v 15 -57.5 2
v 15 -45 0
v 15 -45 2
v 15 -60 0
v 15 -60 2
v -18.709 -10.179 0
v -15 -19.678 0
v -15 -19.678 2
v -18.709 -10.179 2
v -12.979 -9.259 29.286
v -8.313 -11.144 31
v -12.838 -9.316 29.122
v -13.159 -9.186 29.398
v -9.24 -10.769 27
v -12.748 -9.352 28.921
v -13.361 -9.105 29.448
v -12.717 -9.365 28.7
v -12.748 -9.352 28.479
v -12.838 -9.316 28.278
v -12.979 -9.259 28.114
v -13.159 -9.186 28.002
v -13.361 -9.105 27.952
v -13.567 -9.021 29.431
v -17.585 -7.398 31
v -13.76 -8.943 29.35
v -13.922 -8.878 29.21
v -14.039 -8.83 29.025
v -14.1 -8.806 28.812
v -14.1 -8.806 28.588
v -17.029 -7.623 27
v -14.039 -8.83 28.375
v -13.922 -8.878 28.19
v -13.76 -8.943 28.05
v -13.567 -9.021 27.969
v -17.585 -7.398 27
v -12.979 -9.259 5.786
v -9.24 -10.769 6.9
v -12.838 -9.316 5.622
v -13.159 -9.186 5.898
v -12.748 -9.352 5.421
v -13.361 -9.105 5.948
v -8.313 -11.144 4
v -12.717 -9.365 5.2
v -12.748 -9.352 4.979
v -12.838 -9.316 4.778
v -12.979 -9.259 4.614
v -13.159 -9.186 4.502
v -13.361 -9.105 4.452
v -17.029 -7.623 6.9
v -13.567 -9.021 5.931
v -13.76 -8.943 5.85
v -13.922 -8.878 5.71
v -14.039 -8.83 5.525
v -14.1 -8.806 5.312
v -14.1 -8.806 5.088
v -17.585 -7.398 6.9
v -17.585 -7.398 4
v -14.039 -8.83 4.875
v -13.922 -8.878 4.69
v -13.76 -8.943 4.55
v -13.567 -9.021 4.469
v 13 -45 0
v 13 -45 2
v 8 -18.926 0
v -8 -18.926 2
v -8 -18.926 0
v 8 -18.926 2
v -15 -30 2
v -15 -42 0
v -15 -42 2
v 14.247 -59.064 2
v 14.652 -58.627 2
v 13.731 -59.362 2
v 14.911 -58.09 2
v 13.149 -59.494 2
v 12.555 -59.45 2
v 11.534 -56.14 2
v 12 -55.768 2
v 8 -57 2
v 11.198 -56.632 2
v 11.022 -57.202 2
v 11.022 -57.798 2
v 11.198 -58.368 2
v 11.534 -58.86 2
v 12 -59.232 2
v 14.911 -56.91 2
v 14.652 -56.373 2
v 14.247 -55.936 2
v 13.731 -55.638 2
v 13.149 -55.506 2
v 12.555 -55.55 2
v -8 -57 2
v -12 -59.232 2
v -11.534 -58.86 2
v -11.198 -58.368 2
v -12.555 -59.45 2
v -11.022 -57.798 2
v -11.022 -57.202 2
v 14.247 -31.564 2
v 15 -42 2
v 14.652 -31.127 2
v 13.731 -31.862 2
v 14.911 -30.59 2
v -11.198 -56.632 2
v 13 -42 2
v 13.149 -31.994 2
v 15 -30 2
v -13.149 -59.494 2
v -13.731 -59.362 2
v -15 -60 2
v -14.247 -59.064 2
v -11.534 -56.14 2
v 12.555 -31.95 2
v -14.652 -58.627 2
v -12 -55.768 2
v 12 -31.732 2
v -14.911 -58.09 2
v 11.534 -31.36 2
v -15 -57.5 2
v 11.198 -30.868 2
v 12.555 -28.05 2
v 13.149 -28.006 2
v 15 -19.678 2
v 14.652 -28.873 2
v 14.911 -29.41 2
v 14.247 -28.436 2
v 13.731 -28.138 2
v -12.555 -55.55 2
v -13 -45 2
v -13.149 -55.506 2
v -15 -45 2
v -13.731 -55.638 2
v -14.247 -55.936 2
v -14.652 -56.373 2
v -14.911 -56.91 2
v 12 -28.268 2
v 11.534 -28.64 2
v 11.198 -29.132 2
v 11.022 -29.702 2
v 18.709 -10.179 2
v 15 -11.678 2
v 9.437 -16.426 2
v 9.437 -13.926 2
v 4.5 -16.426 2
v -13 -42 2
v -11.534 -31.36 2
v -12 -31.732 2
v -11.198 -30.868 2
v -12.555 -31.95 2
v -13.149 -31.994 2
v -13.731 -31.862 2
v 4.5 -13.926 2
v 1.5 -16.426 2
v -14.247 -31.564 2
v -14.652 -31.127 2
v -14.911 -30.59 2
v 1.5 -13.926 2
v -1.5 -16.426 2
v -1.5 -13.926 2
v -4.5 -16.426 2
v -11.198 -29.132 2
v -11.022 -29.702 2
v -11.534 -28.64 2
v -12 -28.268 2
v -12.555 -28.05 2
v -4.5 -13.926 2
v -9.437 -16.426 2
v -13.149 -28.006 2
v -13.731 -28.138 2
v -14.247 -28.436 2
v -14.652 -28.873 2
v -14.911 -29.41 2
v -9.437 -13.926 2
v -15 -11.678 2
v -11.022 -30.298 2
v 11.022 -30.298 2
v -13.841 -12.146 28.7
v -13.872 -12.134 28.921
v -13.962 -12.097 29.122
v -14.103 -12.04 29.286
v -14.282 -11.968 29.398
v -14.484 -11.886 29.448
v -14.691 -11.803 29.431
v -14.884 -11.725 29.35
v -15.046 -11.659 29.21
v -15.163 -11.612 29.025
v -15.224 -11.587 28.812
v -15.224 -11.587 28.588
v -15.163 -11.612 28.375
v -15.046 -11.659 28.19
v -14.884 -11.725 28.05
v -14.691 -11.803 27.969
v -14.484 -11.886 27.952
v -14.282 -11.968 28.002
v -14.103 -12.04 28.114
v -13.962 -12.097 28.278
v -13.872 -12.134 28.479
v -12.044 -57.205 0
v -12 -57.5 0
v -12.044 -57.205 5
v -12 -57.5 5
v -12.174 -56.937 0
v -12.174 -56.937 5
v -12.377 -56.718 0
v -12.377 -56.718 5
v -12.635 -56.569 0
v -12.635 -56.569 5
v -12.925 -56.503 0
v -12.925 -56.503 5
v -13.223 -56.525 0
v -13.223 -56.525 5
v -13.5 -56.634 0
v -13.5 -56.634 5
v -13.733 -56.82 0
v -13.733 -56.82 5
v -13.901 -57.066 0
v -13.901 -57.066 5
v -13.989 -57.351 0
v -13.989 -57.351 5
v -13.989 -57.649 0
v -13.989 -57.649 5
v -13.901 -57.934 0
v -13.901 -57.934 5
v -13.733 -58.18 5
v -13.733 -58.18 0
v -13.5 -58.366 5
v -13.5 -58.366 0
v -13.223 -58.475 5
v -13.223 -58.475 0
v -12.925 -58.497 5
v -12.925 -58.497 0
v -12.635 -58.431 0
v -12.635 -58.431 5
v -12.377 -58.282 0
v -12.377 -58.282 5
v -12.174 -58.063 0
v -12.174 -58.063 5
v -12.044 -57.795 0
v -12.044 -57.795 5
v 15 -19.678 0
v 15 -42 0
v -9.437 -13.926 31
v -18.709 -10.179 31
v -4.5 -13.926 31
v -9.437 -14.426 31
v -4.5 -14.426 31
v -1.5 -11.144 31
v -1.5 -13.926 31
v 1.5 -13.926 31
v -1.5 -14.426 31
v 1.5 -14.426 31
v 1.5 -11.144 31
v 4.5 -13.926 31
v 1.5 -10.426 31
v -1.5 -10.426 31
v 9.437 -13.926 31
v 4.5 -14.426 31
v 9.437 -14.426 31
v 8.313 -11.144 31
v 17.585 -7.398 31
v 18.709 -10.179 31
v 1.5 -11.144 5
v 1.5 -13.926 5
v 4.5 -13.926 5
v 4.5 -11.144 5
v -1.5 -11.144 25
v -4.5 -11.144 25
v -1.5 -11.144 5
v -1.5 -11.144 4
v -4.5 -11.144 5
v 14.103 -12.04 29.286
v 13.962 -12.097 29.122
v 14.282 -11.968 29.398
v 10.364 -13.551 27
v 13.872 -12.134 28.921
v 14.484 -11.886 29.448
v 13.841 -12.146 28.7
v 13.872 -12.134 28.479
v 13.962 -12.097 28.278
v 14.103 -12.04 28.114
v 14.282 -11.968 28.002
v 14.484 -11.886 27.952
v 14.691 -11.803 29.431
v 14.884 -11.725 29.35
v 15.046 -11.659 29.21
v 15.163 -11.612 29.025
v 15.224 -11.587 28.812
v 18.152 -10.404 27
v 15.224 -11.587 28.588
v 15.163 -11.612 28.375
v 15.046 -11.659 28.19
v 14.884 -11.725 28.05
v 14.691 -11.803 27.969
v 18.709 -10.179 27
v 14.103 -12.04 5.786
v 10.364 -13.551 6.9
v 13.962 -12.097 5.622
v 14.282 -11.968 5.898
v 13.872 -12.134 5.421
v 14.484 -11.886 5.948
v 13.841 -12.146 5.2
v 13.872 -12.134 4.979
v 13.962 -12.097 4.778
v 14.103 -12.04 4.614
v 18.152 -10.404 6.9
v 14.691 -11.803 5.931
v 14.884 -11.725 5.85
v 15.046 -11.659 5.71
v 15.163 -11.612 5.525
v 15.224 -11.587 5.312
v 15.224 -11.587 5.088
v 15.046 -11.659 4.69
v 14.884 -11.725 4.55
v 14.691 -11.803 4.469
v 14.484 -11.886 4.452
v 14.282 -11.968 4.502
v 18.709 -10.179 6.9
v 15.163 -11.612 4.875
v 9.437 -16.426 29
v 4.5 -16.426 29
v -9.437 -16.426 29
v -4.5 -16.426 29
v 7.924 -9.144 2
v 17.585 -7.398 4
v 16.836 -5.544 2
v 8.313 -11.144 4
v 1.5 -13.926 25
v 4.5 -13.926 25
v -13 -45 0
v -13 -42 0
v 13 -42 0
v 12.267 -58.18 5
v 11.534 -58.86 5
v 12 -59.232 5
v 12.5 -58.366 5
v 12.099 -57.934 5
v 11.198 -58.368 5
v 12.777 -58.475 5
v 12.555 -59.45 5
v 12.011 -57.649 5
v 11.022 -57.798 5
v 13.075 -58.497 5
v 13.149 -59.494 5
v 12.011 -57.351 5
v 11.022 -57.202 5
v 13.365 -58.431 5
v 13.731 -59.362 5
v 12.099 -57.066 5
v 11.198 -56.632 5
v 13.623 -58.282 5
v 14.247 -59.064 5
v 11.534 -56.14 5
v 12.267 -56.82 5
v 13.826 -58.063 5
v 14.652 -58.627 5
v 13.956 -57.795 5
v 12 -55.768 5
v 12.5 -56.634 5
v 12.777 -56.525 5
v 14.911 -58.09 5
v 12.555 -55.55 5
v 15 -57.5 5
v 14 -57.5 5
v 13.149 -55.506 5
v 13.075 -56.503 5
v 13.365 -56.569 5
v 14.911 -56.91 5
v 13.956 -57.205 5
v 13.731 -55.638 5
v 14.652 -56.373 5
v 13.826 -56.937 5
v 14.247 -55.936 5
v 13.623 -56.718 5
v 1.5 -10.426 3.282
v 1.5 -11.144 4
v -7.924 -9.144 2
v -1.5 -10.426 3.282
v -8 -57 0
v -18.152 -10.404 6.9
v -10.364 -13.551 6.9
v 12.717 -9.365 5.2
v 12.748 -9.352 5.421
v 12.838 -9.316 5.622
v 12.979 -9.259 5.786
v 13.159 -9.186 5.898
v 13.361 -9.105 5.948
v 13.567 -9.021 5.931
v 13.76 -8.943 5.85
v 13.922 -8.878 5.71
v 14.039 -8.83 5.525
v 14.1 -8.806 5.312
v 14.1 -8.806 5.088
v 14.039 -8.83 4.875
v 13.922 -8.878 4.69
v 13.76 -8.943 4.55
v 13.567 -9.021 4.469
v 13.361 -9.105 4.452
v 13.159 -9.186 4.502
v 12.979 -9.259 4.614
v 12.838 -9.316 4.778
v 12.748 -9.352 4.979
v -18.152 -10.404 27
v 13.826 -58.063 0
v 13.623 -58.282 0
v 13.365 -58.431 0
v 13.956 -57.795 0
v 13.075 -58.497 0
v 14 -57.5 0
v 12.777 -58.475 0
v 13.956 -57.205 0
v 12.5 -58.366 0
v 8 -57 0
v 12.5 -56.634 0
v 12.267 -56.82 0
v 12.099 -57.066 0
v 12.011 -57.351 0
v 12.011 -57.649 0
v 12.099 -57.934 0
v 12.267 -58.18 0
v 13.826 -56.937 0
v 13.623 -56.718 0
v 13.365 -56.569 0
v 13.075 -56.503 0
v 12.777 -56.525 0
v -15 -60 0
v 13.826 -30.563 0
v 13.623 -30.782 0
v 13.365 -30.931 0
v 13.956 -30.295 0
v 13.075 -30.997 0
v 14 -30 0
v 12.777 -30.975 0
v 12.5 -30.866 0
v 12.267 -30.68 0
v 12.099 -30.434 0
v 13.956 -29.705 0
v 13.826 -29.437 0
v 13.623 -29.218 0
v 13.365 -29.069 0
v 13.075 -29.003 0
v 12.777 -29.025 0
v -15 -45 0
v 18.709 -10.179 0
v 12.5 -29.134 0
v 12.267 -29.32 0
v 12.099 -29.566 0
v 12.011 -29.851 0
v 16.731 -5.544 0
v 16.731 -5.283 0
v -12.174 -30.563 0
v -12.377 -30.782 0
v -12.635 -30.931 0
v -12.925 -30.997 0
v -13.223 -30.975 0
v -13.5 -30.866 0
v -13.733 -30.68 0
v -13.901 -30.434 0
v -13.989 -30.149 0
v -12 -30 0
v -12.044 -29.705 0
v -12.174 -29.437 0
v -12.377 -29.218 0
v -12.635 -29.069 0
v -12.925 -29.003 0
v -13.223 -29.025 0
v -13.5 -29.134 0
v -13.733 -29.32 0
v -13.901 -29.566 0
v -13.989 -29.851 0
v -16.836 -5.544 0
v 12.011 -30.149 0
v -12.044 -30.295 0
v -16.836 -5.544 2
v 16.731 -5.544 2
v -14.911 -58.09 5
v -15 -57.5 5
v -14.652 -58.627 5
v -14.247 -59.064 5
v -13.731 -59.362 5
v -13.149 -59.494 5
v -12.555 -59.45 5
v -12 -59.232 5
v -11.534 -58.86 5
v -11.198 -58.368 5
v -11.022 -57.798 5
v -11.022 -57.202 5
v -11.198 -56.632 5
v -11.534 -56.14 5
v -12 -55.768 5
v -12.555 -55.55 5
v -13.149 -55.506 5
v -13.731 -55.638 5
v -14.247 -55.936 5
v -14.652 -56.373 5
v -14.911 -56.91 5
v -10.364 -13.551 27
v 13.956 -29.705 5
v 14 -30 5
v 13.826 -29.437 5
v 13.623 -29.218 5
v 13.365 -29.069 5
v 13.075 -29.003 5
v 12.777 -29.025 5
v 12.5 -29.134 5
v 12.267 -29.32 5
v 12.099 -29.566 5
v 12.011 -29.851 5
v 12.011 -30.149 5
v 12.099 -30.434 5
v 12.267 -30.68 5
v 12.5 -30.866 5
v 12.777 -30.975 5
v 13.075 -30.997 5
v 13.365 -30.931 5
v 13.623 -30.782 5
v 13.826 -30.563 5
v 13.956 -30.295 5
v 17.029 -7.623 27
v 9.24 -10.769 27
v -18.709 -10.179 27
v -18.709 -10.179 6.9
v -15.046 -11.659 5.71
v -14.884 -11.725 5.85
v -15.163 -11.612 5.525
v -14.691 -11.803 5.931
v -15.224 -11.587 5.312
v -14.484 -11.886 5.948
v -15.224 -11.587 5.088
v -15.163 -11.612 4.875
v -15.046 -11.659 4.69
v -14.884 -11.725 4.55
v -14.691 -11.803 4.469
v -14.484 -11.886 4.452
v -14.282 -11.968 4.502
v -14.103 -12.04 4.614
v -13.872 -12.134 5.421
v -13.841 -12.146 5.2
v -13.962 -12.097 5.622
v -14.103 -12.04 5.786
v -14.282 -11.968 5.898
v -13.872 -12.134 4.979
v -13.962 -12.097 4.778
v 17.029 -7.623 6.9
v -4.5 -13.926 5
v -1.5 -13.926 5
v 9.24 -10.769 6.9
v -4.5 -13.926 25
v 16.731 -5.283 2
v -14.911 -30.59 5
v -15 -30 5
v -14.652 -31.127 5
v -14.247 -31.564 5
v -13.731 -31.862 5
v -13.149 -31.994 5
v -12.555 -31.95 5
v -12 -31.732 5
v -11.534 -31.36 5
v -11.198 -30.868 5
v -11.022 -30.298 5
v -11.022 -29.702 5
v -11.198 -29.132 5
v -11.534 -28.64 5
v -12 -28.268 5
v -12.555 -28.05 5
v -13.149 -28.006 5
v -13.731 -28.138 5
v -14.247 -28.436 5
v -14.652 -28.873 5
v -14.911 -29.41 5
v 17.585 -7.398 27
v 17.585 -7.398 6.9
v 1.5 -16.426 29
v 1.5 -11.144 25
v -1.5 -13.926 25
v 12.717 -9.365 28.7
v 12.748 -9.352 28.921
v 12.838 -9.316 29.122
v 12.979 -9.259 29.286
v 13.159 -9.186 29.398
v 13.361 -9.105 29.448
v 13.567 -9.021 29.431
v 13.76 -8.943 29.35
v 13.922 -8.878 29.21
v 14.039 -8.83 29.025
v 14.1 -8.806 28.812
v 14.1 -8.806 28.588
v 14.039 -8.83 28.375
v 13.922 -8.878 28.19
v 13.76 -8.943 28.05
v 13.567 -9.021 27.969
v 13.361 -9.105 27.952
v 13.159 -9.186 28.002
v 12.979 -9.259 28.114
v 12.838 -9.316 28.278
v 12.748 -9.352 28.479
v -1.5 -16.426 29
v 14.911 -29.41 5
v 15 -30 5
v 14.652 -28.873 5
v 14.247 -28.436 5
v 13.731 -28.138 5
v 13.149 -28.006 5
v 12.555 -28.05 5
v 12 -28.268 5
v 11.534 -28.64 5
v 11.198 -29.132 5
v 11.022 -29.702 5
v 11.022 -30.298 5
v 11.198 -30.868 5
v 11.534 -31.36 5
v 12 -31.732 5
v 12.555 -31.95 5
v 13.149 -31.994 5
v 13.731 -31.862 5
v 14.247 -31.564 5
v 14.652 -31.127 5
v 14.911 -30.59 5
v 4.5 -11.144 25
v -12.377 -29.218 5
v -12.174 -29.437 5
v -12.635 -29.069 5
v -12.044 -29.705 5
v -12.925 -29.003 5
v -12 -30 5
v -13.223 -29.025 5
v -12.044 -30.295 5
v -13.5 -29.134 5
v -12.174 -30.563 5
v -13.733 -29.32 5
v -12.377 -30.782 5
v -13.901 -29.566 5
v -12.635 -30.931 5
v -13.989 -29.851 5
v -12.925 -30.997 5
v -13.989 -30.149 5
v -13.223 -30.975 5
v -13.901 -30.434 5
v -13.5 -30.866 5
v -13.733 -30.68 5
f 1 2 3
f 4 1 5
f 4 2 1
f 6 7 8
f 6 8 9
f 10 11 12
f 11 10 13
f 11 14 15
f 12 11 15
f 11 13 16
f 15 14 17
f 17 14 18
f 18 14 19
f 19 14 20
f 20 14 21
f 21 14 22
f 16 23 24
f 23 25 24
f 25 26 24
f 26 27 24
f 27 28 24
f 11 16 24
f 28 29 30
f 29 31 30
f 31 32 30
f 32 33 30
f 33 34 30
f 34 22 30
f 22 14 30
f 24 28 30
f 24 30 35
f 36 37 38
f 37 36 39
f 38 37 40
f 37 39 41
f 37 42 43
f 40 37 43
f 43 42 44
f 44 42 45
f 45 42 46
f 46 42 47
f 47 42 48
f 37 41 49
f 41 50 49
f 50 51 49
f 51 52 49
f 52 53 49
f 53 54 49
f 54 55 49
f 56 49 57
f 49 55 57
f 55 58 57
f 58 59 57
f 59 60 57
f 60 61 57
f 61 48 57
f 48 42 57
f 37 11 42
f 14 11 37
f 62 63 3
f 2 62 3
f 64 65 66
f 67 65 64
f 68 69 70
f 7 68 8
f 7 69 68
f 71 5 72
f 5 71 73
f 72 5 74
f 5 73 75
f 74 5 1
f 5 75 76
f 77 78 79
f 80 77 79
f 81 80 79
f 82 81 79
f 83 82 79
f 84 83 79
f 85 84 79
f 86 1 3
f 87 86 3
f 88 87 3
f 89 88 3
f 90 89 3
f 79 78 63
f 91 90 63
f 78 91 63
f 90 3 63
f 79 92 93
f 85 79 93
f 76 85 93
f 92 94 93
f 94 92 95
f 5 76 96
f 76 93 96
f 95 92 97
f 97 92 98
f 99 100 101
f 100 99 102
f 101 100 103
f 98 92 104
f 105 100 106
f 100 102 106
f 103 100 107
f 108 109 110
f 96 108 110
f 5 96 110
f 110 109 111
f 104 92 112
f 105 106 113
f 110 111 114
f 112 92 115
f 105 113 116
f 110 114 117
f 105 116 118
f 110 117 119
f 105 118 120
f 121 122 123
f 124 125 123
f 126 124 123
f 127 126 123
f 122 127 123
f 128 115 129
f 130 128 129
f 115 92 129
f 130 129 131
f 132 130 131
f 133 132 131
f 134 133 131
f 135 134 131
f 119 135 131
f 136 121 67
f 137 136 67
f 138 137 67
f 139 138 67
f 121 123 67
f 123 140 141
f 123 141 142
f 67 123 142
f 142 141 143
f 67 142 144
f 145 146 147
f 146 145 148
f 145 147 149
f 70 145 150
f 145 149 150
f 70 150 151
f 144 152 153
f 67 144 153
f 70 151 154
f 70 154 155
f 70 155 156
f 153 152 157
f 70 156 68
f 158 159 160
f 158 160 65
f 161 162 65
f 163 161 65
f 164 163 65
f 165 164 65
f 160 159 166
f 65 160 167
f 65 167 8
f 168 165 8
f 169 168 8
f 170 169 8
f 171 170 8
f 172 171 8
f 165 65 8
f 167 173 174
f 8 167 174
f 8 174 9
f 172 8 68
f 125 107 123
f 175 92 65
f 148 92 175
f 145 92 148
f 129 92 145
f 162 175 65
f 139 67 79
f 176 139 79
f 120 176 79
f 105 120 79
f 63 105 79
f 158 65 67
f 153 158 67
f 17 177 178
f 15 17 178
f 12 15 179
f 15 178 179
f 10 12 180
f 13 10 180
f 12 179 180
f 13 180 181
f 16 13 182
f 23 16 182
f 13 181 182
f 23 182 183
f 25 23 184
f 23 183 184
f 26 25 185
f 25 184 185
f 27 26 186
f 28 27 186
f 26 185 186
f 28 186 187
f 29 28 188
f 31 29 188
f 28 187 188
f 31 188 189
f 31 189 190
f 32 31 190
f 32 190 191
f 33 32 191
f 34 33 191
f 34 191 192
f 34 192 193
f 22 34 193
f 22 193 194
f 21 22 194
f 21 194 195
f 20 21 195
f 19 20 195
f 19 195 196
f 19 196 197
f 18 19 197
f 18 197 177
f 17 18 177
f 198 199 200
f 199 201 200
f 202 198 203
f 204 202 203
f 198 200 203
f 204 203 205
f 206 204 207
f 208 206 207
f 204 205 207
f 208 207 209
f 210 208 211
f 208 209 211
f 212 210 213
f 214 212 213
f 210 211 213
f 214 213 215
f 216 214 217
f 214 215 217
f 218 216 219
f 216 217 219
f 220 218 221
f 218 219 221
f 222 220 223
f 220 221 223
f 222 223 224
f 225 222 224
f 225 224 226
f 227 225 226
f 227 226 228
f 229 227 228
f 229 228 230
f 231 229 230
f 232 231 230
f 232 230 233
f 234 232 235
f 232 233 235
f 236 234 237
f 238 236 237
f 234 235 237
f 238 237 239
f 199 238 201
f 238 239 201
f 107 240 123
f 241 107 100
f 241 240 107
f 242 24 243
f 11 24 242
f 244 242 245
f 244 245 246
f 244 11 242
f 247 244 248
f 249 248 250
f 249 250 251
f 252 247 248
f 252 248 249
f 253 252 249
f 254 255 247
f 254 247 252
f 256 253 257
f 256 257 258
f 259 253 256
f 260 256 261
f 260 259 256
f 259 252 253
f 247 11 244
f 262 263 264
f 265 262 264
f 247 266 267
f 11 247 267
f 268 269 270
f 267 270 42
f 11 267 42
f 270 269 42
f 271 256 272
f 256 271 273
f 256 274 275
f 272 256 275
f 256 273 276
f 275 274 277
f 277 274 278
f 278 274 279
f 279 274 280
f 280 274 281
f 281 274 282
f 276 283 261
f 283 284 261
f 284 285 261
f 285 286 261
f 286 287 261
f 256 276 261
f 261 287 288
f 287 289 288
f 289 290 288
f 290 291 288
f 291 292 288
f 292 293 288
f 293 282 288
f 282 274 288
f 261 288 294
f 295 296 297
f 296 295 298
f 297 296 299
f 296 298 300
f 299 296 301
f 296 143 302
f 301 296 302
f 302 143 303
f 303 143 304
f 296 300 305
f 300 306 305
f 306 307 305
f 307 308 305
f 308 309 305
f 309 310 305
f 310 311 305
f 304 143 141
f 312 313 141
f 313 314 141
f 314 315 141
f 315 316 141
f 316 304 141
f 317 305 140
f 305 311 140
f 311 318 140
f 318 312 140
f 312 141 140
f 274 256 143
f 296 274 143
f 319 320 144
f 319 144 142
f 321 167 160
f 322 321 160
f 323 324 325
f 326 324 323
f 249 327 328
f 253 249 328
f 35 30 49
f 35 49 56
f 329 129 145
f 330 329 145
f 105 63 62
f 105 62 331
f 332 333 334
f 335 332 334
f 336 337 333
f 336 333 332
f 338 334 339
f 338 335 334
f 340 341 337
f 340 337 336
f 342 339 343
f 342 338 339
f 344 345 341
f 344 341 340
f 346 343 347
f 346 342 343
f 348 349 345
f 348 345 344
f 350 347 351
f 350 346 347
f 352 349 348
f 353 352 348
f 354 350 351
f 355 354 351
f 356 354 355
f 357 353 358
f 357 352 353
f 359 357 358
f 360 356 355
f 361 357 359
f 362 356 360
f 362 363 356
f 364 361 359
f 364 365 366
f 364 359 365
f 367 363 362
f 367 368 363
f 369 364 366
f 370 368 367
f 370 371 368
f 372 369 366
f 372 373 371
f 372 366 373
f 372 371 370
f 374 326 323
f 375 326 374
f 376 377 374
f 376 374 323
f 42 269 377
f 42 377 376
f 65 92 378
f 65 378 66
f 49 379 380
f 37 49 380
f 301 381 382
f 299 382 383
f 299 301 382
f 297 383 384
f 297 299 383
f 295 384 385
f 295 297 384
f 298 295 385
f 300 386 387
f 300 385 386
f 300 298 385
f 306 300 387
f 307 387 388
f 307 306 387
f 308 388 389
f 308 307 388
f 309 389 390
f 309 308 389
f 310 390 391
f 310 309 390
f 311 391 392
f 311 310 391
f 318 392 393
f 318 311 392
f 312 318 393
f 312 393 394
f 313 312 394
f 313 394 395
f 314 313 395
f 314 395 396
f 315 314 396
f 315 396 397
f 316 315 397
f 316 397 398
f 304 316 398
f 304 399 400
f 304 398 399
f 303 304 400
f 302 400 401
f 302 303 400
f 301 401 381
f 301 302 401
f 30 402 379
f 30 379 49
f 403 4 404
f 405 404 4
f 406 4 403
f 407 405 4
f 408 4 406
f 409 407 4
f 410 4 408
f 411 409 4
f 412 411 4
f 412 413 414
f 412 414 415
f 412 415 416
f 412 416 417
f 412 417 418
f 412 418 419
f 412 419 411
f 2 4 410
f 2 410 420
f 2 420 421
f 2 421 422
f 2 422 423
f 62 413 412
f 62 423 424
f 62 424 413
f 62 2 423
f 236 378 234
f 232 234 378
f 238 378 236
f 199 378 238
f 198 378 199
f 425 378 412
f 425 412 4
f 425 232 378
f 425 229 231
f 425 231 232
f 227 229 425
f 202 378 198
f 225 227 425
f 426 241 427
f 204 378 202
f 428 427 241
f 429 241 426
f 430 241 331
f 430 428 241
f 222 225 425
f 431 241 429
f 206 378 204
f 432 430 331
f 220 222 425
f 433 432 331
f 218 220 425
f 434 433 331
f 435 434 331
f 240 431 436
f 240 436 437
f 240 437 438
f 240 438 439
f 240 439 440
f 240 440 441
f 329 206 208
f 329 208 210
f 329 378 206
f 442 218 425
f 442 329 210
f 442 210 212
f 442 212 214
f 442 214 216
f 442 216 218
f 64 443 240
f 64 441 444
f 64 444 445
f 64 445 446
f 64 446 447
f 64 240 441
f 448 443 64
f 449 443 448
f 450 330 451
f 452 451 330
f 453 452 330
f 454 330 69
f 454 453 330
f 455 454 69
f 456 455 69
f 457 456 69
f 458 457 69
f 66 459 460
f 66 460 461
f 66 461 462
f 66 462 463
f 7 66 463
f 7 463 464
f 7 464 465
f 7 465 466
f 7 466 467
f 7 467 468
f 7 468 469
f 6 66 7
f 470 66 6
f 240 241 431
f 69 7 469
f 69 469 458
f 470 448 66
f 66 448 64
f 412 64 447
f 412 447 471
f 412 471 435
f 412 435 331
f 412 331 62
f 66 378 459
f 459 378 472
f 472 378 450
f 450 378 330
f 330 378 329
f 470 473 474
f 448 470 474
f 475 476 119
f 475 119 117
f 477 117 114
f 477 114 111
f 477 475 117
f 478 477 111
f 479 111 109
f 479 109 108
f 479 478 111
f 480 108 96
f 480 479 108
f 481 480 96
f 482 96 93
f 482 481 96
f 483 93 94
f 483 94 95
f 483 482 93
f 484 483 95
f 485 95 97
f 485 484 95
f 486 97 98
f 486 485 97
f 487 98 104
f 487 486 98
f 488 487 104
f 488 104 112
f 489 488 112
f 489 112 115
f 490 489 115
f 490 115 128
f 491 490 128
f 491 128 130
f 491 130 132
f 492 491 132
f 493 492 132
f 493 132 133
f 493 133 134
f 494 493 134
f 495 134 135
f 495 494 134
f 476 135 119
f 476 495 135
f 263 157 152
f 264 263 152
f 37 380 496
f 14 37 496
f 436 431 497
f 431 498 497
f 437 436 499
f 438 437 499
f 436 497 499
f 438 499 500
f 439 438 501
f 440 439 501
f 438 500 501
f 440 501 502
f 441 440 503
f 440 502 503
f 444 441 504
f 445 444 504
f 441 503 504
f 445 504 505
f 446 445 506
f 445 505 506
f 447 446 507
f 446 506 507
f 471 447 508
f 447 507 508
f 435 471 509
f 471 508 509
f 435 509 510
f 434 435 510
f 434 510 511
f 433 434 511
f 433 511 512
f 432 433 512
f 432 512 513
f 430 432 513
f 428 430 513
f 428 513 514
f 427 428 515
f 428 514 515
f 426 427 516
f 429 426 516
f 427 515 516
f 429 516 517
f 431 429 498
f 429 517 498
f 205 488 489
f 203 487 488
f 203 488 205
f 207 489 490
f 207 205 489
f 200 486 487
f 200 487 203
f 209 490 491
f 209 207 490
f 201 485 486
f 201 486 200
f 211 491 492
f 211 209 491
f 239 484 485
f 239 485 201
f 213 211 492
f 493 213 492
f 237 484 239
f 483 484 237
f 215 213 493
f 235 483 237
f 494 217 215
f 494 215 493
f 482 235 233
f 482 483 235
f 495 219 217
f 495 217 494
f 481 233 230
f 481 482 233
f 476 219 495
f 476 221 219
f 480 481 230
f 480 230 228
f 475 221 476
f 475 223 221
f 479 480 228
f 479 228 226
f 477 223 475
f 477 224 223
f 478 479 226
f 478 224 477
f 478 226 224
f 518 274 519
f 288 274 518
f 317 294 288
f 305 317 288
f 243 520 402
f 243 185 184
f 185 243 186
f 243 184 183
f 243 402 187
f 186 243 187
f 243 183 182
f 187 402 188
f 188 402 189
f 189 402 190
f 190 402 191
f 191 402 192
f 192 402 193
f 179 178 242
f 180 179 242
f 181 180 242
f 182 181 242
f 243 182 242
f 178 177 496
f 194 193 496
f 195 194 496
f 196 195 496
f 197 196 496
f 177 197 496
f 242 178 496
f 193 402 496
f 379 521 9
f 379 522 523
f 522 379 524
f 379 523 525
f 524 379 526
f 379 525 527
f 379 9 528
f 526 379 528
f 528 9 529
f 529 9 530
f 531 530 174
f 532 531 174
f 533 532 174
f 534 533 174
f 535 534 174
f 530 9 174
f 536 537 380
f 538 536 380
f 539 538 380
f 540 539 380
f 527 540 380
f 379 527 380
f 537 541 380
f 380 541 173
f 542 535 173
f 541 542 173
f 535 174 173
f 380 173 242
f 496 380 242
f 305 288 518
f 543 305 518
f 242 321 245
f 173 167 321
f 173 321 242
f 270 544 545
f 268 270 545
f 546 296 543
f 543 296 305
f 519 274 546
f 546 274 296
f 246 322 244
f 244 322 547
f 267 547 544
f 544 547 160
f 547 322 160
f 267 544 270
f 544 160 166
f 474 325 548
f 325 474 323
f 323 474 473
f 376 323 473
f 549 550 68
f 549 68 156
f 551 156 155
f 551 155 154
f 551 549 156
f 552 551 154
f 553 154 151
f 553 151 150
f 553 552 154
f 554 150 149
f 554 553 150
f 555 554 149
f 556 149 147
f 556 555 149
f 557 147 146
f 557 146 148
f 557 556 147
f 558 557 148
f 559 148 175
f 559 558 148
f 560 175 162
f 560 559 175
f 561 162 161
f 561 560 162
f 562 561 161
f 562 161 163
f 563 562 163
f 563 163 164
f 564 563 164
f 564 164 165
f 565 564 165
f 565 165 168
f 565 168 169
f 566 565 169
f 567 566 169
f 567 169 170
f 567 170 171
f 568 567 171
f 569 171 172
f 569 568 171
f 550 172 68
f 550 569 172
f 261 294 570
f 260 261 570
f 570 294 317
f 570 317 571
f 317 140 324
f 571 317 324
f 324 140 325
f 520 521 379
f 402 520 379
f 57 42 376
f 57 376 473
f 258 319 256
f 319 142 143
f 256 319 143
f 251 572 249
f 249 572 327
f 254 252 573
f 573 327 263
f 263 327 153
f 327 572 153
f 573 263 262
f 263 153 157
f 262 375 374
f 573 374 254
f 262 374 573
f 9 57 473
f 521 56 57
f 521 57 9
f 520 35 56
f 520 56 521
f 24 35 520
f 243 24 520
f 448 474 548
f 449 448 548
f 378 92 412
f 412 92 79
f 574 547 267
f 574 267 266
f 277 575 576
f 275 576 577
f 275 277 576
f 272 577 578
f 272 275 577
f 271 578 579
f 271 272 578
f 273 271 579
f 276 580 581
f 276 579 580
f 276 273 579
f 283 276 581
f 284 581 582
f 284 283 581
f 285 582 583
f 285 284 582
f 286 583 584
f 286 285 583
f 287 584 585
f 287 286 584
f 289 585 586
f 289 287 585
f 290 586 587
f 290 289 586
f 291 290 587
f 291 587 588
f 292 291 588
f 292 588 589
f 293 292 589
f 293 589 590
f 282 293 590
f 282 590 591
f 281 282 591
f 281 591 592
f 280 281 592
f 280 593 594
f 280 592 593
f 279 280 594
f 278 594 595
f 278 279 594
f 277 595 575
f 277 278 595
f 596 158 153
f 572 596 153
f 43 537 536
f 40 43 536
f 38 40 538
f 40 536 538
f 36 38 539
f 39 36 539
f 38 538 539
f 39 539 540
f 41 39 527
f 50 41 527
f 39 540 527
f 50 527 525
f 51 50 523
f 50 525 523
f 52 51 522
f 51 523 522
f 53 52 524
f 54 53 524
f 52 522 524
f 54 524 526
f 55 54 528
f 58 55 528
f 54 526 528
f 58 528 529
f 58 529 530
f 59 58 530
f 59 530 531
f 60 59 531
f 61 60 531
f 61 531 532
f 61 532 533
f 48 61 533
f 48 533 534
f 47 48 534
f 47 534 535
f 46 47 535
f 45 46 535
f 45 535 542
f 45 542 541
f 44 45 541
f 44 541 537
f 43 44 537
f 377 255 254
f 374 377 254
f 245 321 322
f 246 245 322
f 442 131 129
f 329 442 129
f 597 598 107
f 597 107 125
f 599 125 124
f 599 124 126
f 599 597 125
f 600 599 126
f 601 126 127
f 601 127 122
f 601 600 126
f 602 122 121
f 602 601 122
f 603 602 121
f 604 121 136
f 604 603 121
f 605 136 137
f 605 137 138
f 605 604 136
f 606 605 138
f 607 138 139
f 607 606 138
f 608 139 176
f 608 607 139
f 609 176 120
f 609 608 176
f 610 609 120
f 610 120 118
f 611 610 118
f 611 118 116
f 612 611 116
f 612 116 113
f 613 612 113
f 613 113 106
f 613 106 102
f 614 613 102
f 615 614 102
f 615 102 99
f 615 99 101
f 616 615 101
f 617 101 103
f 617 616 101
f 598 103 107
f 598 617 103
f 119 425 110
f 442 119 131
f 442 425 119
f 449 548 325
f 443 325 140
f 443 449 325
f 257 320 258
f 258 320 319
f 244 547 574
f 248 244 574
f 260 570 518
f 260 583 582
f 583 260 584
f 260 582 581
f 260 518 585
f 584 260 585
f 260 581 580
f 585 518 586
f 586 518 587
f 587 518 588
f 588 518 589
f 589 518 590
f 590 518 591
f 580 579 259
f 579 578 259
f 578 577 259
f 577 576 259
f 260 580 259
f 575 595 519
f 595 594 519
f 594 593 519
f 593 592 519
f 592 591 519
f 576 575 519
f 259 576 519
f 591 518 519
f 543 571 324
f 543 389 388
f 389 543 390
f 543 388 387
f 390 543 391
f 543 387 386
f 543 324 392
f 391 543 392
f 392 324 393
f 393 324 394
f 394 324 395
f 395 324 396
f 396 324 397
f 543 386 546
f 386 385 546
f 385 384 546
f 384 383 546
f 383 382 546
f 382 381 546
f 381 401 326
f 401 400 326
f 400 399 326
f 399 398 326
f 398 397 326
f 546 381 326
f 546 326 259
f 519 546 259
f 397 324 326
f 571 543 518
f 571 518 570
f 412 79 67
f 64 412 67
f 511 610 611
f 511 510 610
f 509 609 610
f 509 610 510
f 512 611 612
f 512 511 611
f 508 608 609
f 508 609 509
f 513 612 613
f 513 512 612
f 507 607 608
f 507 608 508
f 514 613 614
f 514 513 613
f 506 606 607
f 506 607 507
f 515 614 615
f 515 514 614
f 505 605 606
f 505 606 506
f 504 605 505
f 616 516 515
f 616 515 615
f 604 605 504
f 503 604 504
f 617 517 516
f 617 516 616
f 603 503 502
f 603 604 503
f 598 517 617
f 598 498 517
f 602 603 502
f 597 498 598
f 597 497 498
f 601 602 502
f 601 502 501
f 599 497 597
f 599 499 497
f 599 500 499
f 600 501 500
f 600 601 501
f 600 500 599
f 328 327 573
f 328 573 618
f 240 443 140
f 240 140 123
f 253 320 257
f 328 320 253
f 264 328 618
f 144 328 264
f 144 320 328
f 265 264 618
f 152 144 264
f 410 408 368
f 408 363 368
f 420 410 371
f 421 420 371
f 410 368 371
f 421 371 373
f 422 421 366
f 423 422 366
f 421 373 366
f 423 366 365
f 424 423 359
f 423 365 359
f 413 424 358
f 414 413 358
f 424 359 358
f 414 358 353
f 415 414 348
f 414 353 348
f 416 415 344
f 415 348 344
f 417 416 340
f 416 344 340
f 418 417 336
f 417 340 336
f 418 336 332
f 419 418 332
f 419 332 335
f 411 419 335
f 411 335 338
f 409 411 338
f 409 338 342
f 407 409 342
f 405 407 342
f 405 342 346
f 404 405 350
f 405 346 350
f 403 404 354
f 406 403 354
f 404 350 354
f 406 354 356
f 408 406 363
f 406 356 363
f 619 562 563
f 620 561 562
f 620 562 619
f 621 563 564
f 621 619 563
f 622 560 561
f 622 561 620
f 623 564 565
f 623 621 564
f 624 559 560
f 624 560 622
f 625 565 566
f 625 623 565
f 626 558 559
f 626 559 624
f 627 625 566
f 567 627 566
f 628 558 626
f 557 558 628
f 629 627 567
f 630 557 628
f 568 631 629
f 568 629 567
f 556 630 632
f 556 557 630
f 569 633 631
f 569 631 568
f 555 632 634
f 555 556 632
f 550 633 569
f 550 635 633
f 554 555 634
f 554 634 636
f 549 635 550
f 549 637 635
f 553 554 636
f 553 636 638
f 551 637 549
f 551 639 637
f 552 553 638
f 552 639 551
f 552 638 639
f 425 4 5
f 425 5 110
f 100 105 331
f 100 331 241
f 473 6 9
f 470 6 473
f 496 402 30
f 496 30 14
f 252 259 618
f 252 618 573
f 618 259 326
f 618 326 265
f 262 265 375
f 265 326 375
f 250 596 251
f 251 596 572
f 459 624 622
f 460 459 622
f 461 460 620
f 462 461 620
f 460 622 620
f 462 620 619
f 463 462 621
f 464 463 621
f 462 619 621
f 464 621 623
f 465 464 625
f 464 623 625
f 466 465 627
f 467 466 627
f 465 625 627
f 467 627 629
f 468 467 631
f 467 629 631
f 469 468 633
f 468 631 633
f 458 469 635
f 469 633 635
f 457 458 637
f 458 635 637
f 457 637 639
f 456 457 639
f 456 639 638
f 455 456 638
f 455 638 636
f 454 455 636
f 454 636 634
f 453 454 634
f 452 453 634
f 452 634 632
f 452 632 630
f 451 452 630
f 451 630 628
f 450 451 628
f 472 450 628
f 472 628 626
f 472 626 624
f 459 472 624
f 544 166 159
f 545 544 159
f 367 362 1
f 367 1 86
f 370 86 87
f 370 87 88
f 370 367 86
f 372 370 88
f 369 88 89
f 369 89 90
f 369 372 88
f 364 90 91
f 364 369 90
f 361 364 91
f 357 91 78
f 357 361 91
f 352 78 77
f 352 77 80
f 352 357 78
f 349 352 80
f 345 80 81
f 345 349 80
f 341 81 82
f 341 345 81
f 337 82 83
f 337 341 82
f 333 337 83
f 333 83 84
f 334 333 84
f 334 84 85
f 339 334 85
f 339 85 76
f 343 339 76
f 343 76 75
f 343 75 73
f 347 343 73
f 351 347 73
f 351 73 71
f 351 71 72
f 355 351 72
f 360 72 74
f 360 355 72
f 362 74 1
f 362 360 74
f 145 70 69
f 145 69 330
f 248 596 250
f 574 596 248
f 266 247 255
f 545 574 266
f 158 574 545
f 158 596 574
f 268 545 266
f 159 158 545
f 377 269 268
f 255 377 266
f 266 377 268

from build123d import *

# Parameters (mm, degrees)
EXTRUDE_1_DEPTH      = 2
EXTRUDE_2_DEPTH      = 29
EXTRUDE_2_DEPTH_BACK = 2
CUT_EXTRUDE_5_REACH  = 60.965
SKETCH_3_R           = 0.75
SKETCH_3_W           = 9
SKETCH_3_H           = 20.1
CUT_EXTRUDE_7_REACH  = 61.851
SKETCH_12_R          = 0.75
SKETCH_12_W          = 9
SKETCH_12_H          = 20.1
CUT_EXTRUDE_8_REACH  = 71.217
SKETCH_13_R          = 1
SKETCH_13_W          = 16
SKETCH_13_H          = 38.074491789
SKETCH_13_W_2        = 2
SKETCH_13_H_2        = 3
CHAMFER_4_SIZE       = 1
CHAMFER_5_SIZE       = 2
EXTRUDE_START        = -29
SKETCH_14_W          = 3
SKETCH_14_H          = 6
SKETCH_14_W_2        = 4.936896873
SKETCH_14_H_2        = 2.5
EXTRUDE_8_DEPTH      = 29
CHAMFER_6_SIZE       = 2
EXTRUDE_START_2      = 3
SKETCH_15_R          = 2
SKETCH_15_R_2        = 1
EXTRUDE_9_DEPTH      = 3
CUT_EXTRUDE_9_REACH  = 60.599
SKETCH_16_W          = 3
SKETCH_16_H          = 20
EXTRUDE_10_DEPTH     = 2
EXTRUDE_11_DEPTH     = 24.1
CUT_EXTRUDE_11_REACH = 71.217
SKETCH_20_W          = 33.566306147
SKETCH_20_H          = 6.687524296


with BuildPart() as part:
    # 草圖1 → 填料-伸長1 (new body)
    with BuildSketch(Plane.XY):
        Polygon((-15, 0), (15, 0), (15, -1), (18.708735418, -10.179442277), (15, -11.67786865), (15, -60), (-15, -60), (-15, -11.67786865), (-18.708735418, -10.179442277), (-15, -1), align=None)
    extrude(amount=EXTRUDE_1_DEPTH)

    # 草圖2 → 填料-伸長2 (add, two sides: drawn at the far end of the back side and taken through both)
    with BuildSketch(Plane.XY.offset(2).offset(-EXTRUDE_2_DEPTH_BACK)):
        Polygon((-18.708735418, -10.179442277), (-9.436896873, -13.925508211), (9.436896873, -13.925508211), (18.708735418, -10.179442277), (17.584915638, -7.397890713), (8.313077092, -11.143956647), (-8.313077092, -11.143956647), (-17.584915638, -7.397890713), align=None)
    extrude(amount=EXTRUDE_2_DEPTH + EXTRUDE_2_DEPTH_BACK)

    # 草圖3 → 除料-伸長5 (cut, up to next)
    with BuildSketch(Plane(origin=(4.914686172, -15.752599933, 0), x_dir=(0.9271838545667884, 0.37460659341590963, 0), z_dir=(-0.37460659341590963, 0.9271838545667884, 0)), mode=Mode.PRIVATE) as cut_extrude_5_sk1:
        with Locations(Location((10.377361354, -5.2, 0), (0, 0, 180))):
            Circle(SKETCH_3_R)
    cut_extrude_5_tool1 = extrude(cut_extrude_5_sk1.sketch, amount=CUT_EXTRUDE_5_REACH, mode=Mode.PRIVATE) & part.part
    # 草圖3 → 除料-伸長5 (cut, up to next)
    with BuildSketch(Plane(origin=(4.914686172, -15.752599933, 0), x_dir=(0.9271838545667884, 0.37460659341590963, 0), z_dir=(-0.37460659341590963, 0.9271838545667884, 0)), mode=Mode.PRIVATE) as cut_extrude_5_sk2:
        with Locations(Location((10.377361354, -28.7, 0), (0, 0, 180))):
            Circle(SKETCH_3_R)
    cut_extrude_5_tool2 = extrude(cut_extrude_5_sk2.sketch, amount=CUT_EXTRUDE_5_REACH, mode=Mode.PRIVATE) & part.part
    # 草圖3 → 除料-伸長5 (cut, up to next)
    with BuildSketch(Plane(origin=(4.914686172, -15.752599933, 0), x_dir=(0.9271838545667884, 0.37460659341590963, 0), z_dir=(-0.37460659341590963, 0.9271838545667884, 0)), mode=Mode.PRIVATE) as cut_extrude_5_sk3:
        with Locations((10.377361354, -16.95)):
            Rectangle(SKETCH_3_W, SKETCH_3_H)
    cut_extrude_5_tool3 = extrude(cut_extrude_5_sk3.sketch, amount=CUT_EXTRUDE_5_REACH, mode=Mode.PRIVATE) & part.part
    add(cut_extrude_5_tool1.solids().sort_by_distance((14.536408, -11.865172, 5.2))[0], mode=Mode.SUBTRACT)
    add(cut_extrude_5_tool2.solids().sort_by_distance((14.536408, -11.865172, 28.7))[0], mode=Mode.SUBTRACT)
    add(cut_extrude_5_tool3.solids().sort_by_distance((14.536408, -11.865172, 16.95))[0], mode=Mode.SUBTRACT)

    # 草圖12 → 除料-伸長7 (cut, up to next)
    with BuildSketch(Plane(origin=(-6.161016101, -15.249049955, 0), x_dir=(0.9271838545667846, -0.3746065934159192, 0), z_dir=(-0.3746065934159192, -0.9271838545667846, 0)), mode=Mode.PRIVATE) as cut_extrude_7_sk1:
        with Locations((-9.033151225, 28.7)):
            Circle(SKETCH_12_R)
    cut_extrude_7_tool1 = extrude(cut_extrude_7_sk1.sketch, amount=-CUT_EXTRUDE_7_REACH, mode=Mode.PRIVATE) & part.part
    # 草圖12 → 除料-伸長7 (cut, up to next)
    with BuildSketch(Plane(origin=(-6.161016101, -15.249049955, 0), x_dir=(0.9271838545667846, -0.3746065934159192, 0), z_dir=(-0.3746065934159192, -0.9271838545667846, 0)), mode=Mode.PRIVATE) as cut_extrude_7_sk2:
        with Locations((-9.033151225, 5.2)):
            Circle(SKETCH_12_R)
    cut_extrude_7_tool2 = extrude(cut_extrude_7_sk2.sketch, amount=-CUT_EXTRUDE_7_REACH, mode=Mode.PRIVATE) & part.part
    # 草圖12 → 除料-伸長7 (cut, up to next)
    with BuildSketch(Plane(origin=(-6.161016101, -15.249049955, 0), x_dir=(0.9271838545667846, -0.3746065934159192, 0), z_dir=(-0.3746065934159192, -0.9271838545667846, 0)), mode=Mode.PRIVATE) as cut_extrude_7_sk3:
        with Locations((-9.033151225, 16.95)):
            Rectangle(SKETCH_12_W, SKETCH_12_H)
    cut_extrude_7_tool3 = extrude(cut_extrude_7_sk3.sketch, amount=-CUT_EXTRUDE_7_REACH, mode=Mode.PRIVATE) & part.part
    add(cut_extrude_7_tool1.solids().sort_by_distance((-14.536408, -11.865172, 28.7))[0], mode=Mode.SUBTRACT)
    add(cut_extrude_7_tool2.solids().sort_by_distance((-14.536408, -11.865172, 5.2))[0], mode=Mode.SUBTRACT)
    add(cut_extrude_7_tool3.solids().sort_by_distance((-14.536408, -11.865172, 16.95))[0], mode=Mode.SUBTRACT)

    # 草圖13 → 除料-伸長8 (cut, up to next)
    with BuildSketch(Plane.XY.offset(2), mode=Mode.PRIVATE) as cut_extrude_8_sk1:
        with Locations((-13, -30)):
            Circle(SKETCH_13_R)
    cut_extrude_8_tool1 = extrude(cut_extrude_8_sk1.sketch, amount=-CUT_EXTRUDE_8_REACH, mode=Mode.PRIVATE) & part.part
    # 草圖13 → 除料-伸長8 (cut, up to next)
    with BuildSketch(Plane.XY.offset(2), mode=Mode.PRIVATE) as cut_extrude_8_sk2:
        with Locations((13, -30)):
            Circle(SKETCH_13_R)
    cut_extrude_8_tool2 = extrude(cut_extrude_8_sk2.sketch, amount=-CUT_EXTRUDE_8_REACH, mode=Mode.PRIVATE) & part.part
    # 草圖13 → 除料-伸長8 (cut, up to next)
    with BuildSketch(Plane.XY.offset(2), mode=Mode.PRIVATE) as cut_extrude_8_sk3:
        with Locations((-13, -57.5)):
            Circle(SKETCH_13_R)
    cut_extrude_8_tool3 = extrude(cut_extrude_8_sk3.sketch, amount=-CUT_EXTRUDE_8_REACH, mode=Mode.PRIVATE) & part.part
    # 草圖13 → 除料-伸長8 (cut, up to next)
    with BuildSketch(Plane.XY.offset(2), mode=Mode.PRIVATE) as cut_extrude_8_sk4:
        with Locations((13, -57.5)):
            Circle(SKETCH_13_R)
    cut_extrude_8_tool4 = extrude(cut_extrude_8_sk4.sketch, amount=-CUT_EXTRUDE_8_REACH, mode=Mode.PRIVATE) & part.part
    # 草圖13 → 除料-伸長8 (cut, up to next)
    with BuildSketch(Plane.XY.offset(2), mode=Mode.PRIVATE) as cut_extrude_8_sk5:
        with Locations((0, -37.962754105)):
            Rectangle(SKETCH_13_W, SKETCH_13_H)
    cut_extrude_8_tool5 = extrude(cut_extrude_8_sk5.sketch, amount=-CUT_EXTRUDE_8_REACH, mode=Mode.PRIVATE) & part.part
    # 草圖13 → 除料-伸長8 (cut, up to next)
    with BuildSketch(Plane.XY.offset(2), mode=Mode.PRIVATE) as cut_extrude_8_sk6:
        with Locations((-14, -43.5)):
            Rectangle(SKETCH_13_W_2, SKETCH_13_H_2)
    cut_extrude_8_tool6 = extrude(cut_extrude_8_sk6.sketch, amount=-CUT_EXTRUDE_8_REACH, mode=Mode.PRIVATE) & part.part
    # 草圖13 → 除料-伸長8 (cut, up to next)
    with BuildSketch(Plane.XY.offset(2), mode=Mode.PRIVATE) as cut_extrude_8_sk7:
        with Locations((14, -43.5)):
            Rectangle(SKETCH_13_W_2, SKETCH_13_H_2)
    cut_extrude_8_tool7 = extrude(cut_extrude_8_sk7.sketch, amount=-CUT_EXTRUDE_8_REACH, mode=Mode.PRIVATE) & part.part
    add(cut_extrude_8_tool1.solids().sort_by_distance((-13, -30, 2))[0], mode=Mode.SUBTRACT)
    add(cut_extrude_8_tool2.solids().sort_by_distance((13, -30, 2))[0], mode=Mode.SUBTRACT)
    add(cut_extrude_8_tool3.solids().sort_by_distance((-13, -57.5, 2))[0], mode=Mode.SUBTRACT)
    add(cut_extrude_8_tool4.solids().sort_by_distance((13, -57.5, 2))[0], mode=Mode.SUBTRACT)
    add(cut_extrude_8_tool5.solids().sort_by_distance((0, -37.962754, 2))[0], mode=Mode.SUBTRACT)
    add(cut_extrude_8_tool6.solids().sort_by_distance((-14, -43.5, 2))[0], mode=Mode.SUBTRACT)
    add(cut_extrude_8_tool7.solids().sort_by_distance((14, -43.5, 2))[0], mode=Mode.SUBTRACT)

    # 導角4
    chamfer_4_edges = [part.edges().sort_by_distance(p)[0] for p in [
        (-15, 0, 1),
        (15, 0, 1),
    ]]
    chamfer(chamfer_4_edges, length=CHAMFER_4_SIZE - 0.0001)  # a hair under: the kernel refuses the full size

    # 導角5
    chamfer_5_edges = [part.edges().sort_by_distance(p)[0] for p in [
        (-12.948996365, -9.27092368, 2),
        (0, -11.143956647, 2),
        (12.948996365, -9.27092368, 2),
    ]]
    chamfer(chamfer_5_edges, length=CHAMFER_5_SIZE)

    # 草圖14 → 填料-伸長8 (add)
    with BuildSketch(Plane.XY.offset(31).offset(EXTRUDE_START)):
        with Locations((0, -13.425508211)):
            Rectangle(SKETCH_14_W, SKETCH_14_H)
        with Locations((-6.968448437, -15.175508211)):
            Rectangle(SKETCH_14_W_2, SKETCH_14_H_2)
        with Locations((6.968448437, -15.175508211)):
            Rectangle(SKETCH_14_W_2, SKETCH_14_H_2)
    extrude(amount=EXTRUDE_8_DEPTH)

    # 導角6
    chamfer_6_edges = [part.edges().sort_by_distance(p)[0] for p in [
        (0, -16.425508211, 31),
        (-6.968448436, -16.425508211, 31),
        (6.968448436, -16.425508211, 31),
    ]]
    chamfer(chamfer_6_edges, length=CHAMFER_6_SIZE)

    # 草圖15 → 填料-伸長9 (add)
    # profile 1 of 4: a face of its own
    with BuildSketch(Plane.XY.offset(2).offset(EXTRUDE_START_2)):
        with Locations(Location((-13, -30, 0), (0, 0, 180))):
            Circle(SKETCH_15_R)
        with Locations((-13, -30)):
            Circle(SKETCH_15_R_2, mode=Mode.SUBTRACT)
    # profile 2 of 4: a face of its own
    with BuildSketch(Plane.XY.offset(2).offset(EXTRUDE_START_2)):
        with Locations((13, -30)):
            Circle(SKETCH_15_R)
        with Locations((13, -30)):
            Circle(SKETCH_15_R_2, mode=Mode.SUBTRACT)
    # profile 3 of 4: a face of its own
    with BuildSketch(Plane.XY.offset(2).offset(EXTRUDE_START_2)):
        with Locations((13, -57.5)):
            Circle(SKETCH_15_R)
        with Locations((13, -57.5)):
            Circle(SKETCH_15_R_2, mode=Mode.SUBTRACT)
    # profile 4 of 4: a face of its own
    with BuildSketch(Plane.XY.offset(2).offset(EXTRUDE_START_2)):
        with Locations(Location((-13, -57.5, 0), (0, 0, 180))):
            Circle(SKETCH_15_R)
        with Locations((-13, -57.5)):
            Circle(SKETCH_15_R_2, mode=Mode.SUBTRACT)
    extrude(amount=-EXTRUDE_9_DEPTH)

    # 草圖16 → 除料-伸長9 (cut, up to next)
    with BuildSketch(Plane.XZ.offset(13.925508211), mode=Mode.PRIVATE) as cut_extrude_9_sk1:
        with Locations((-3, 15)):
            Rectangle(SKETCH_16_W, SKETCH_16_H)
    cut_extrude_9_tool1 = extrude(cut_extrude_9_sk1.sketch, amount=-CUT_EXTRUDE_9_REACH, mode=Mode.PRIVATE) & part.part
    # 草圖16 → 除料-伸長9 (cut, up to next)
    with BuildSketch(Plane.XZ.offset(13.925508211), mode=Mode.PRIVATE) as cut_extrude_9_sk2:
        with Locations((3, 15)):
            Rectangle(SKETCH_16_W, SKETCH_16_H)
    cut_extrude_9_tool2 = extrude(cut_extrude_9_sk2.sketch, amount=-CUT_EXTRUDE_9_REACH, mode=Mode.PRIVATE) & part.part
    add(cut_extrude_9_tool1.solids().sort_by_distance((-3, -13.925508, 15))[0], mode=Mode.SUBTRACT)
    add(cut_extrude_9_tool2.solids().sort_by_distance((3, -13.925508, 15))[0], mode=Mode.SUBTRACT)

    # 草圖17 → 填料-伸長10 (add)
    with BuildSketch(Plane(origin=(0, 0, 0), x_dir=(-1, 0, 0), z_dir=(0, 0, -1))):
        Polygon((-18.708735418, -10.179442277), (-15, -19.67786865), (-15, -11.67786865), align=None)
        Polygon((18.708735418, -10.179442277), (15, -11.67786865), (15, -19.67786865), align=None)
    extrude(amount=-EXTRUDE_10_DEPTH)

    # 草圖18 → 填料-伸長11 (add)
    with BuildSketch(Plane.XY.offset(31)):
        Polygon((-17.584915638, -7.397890713), (-18.708735418, -10.179442277), (-18.152425106, -10.404206233), (-17.028605325, -7.622654669), align=None)
        Polygon((17.584915638, -7.397890713), (18.708735418, -10.179442277), (18.152425106, -10.404206233), (17.028605325, -7.622654669), align=None)
    extrude(amount=-EXTRUDE_11_DEPTH)

    # 草圖20 → 除料-伸長11 (cut, up to next)
    with BuildSketch(Plane.XY.offset(2), mode=Mode.PRIVATE) as cut_extrude_11_sk1:
        with Locations((-0.052549378, -2.199760856)):
            Rectangle(SKETCH_20_W, SKETCH_20_H)
    cut_extrude_11_tool1 = extrude(cut_extrude_11_sk1.sketch, amount=-CUT_EXTRUDE_11_REACH, mode=Mode.PRIVATE) & part.part
    add(cut_extrude_11_tool1.solids().sort_by_distance((-0.052549, -2.199761, 2))[0], mode=Mode.SUBTRACT)


solid = part.part
